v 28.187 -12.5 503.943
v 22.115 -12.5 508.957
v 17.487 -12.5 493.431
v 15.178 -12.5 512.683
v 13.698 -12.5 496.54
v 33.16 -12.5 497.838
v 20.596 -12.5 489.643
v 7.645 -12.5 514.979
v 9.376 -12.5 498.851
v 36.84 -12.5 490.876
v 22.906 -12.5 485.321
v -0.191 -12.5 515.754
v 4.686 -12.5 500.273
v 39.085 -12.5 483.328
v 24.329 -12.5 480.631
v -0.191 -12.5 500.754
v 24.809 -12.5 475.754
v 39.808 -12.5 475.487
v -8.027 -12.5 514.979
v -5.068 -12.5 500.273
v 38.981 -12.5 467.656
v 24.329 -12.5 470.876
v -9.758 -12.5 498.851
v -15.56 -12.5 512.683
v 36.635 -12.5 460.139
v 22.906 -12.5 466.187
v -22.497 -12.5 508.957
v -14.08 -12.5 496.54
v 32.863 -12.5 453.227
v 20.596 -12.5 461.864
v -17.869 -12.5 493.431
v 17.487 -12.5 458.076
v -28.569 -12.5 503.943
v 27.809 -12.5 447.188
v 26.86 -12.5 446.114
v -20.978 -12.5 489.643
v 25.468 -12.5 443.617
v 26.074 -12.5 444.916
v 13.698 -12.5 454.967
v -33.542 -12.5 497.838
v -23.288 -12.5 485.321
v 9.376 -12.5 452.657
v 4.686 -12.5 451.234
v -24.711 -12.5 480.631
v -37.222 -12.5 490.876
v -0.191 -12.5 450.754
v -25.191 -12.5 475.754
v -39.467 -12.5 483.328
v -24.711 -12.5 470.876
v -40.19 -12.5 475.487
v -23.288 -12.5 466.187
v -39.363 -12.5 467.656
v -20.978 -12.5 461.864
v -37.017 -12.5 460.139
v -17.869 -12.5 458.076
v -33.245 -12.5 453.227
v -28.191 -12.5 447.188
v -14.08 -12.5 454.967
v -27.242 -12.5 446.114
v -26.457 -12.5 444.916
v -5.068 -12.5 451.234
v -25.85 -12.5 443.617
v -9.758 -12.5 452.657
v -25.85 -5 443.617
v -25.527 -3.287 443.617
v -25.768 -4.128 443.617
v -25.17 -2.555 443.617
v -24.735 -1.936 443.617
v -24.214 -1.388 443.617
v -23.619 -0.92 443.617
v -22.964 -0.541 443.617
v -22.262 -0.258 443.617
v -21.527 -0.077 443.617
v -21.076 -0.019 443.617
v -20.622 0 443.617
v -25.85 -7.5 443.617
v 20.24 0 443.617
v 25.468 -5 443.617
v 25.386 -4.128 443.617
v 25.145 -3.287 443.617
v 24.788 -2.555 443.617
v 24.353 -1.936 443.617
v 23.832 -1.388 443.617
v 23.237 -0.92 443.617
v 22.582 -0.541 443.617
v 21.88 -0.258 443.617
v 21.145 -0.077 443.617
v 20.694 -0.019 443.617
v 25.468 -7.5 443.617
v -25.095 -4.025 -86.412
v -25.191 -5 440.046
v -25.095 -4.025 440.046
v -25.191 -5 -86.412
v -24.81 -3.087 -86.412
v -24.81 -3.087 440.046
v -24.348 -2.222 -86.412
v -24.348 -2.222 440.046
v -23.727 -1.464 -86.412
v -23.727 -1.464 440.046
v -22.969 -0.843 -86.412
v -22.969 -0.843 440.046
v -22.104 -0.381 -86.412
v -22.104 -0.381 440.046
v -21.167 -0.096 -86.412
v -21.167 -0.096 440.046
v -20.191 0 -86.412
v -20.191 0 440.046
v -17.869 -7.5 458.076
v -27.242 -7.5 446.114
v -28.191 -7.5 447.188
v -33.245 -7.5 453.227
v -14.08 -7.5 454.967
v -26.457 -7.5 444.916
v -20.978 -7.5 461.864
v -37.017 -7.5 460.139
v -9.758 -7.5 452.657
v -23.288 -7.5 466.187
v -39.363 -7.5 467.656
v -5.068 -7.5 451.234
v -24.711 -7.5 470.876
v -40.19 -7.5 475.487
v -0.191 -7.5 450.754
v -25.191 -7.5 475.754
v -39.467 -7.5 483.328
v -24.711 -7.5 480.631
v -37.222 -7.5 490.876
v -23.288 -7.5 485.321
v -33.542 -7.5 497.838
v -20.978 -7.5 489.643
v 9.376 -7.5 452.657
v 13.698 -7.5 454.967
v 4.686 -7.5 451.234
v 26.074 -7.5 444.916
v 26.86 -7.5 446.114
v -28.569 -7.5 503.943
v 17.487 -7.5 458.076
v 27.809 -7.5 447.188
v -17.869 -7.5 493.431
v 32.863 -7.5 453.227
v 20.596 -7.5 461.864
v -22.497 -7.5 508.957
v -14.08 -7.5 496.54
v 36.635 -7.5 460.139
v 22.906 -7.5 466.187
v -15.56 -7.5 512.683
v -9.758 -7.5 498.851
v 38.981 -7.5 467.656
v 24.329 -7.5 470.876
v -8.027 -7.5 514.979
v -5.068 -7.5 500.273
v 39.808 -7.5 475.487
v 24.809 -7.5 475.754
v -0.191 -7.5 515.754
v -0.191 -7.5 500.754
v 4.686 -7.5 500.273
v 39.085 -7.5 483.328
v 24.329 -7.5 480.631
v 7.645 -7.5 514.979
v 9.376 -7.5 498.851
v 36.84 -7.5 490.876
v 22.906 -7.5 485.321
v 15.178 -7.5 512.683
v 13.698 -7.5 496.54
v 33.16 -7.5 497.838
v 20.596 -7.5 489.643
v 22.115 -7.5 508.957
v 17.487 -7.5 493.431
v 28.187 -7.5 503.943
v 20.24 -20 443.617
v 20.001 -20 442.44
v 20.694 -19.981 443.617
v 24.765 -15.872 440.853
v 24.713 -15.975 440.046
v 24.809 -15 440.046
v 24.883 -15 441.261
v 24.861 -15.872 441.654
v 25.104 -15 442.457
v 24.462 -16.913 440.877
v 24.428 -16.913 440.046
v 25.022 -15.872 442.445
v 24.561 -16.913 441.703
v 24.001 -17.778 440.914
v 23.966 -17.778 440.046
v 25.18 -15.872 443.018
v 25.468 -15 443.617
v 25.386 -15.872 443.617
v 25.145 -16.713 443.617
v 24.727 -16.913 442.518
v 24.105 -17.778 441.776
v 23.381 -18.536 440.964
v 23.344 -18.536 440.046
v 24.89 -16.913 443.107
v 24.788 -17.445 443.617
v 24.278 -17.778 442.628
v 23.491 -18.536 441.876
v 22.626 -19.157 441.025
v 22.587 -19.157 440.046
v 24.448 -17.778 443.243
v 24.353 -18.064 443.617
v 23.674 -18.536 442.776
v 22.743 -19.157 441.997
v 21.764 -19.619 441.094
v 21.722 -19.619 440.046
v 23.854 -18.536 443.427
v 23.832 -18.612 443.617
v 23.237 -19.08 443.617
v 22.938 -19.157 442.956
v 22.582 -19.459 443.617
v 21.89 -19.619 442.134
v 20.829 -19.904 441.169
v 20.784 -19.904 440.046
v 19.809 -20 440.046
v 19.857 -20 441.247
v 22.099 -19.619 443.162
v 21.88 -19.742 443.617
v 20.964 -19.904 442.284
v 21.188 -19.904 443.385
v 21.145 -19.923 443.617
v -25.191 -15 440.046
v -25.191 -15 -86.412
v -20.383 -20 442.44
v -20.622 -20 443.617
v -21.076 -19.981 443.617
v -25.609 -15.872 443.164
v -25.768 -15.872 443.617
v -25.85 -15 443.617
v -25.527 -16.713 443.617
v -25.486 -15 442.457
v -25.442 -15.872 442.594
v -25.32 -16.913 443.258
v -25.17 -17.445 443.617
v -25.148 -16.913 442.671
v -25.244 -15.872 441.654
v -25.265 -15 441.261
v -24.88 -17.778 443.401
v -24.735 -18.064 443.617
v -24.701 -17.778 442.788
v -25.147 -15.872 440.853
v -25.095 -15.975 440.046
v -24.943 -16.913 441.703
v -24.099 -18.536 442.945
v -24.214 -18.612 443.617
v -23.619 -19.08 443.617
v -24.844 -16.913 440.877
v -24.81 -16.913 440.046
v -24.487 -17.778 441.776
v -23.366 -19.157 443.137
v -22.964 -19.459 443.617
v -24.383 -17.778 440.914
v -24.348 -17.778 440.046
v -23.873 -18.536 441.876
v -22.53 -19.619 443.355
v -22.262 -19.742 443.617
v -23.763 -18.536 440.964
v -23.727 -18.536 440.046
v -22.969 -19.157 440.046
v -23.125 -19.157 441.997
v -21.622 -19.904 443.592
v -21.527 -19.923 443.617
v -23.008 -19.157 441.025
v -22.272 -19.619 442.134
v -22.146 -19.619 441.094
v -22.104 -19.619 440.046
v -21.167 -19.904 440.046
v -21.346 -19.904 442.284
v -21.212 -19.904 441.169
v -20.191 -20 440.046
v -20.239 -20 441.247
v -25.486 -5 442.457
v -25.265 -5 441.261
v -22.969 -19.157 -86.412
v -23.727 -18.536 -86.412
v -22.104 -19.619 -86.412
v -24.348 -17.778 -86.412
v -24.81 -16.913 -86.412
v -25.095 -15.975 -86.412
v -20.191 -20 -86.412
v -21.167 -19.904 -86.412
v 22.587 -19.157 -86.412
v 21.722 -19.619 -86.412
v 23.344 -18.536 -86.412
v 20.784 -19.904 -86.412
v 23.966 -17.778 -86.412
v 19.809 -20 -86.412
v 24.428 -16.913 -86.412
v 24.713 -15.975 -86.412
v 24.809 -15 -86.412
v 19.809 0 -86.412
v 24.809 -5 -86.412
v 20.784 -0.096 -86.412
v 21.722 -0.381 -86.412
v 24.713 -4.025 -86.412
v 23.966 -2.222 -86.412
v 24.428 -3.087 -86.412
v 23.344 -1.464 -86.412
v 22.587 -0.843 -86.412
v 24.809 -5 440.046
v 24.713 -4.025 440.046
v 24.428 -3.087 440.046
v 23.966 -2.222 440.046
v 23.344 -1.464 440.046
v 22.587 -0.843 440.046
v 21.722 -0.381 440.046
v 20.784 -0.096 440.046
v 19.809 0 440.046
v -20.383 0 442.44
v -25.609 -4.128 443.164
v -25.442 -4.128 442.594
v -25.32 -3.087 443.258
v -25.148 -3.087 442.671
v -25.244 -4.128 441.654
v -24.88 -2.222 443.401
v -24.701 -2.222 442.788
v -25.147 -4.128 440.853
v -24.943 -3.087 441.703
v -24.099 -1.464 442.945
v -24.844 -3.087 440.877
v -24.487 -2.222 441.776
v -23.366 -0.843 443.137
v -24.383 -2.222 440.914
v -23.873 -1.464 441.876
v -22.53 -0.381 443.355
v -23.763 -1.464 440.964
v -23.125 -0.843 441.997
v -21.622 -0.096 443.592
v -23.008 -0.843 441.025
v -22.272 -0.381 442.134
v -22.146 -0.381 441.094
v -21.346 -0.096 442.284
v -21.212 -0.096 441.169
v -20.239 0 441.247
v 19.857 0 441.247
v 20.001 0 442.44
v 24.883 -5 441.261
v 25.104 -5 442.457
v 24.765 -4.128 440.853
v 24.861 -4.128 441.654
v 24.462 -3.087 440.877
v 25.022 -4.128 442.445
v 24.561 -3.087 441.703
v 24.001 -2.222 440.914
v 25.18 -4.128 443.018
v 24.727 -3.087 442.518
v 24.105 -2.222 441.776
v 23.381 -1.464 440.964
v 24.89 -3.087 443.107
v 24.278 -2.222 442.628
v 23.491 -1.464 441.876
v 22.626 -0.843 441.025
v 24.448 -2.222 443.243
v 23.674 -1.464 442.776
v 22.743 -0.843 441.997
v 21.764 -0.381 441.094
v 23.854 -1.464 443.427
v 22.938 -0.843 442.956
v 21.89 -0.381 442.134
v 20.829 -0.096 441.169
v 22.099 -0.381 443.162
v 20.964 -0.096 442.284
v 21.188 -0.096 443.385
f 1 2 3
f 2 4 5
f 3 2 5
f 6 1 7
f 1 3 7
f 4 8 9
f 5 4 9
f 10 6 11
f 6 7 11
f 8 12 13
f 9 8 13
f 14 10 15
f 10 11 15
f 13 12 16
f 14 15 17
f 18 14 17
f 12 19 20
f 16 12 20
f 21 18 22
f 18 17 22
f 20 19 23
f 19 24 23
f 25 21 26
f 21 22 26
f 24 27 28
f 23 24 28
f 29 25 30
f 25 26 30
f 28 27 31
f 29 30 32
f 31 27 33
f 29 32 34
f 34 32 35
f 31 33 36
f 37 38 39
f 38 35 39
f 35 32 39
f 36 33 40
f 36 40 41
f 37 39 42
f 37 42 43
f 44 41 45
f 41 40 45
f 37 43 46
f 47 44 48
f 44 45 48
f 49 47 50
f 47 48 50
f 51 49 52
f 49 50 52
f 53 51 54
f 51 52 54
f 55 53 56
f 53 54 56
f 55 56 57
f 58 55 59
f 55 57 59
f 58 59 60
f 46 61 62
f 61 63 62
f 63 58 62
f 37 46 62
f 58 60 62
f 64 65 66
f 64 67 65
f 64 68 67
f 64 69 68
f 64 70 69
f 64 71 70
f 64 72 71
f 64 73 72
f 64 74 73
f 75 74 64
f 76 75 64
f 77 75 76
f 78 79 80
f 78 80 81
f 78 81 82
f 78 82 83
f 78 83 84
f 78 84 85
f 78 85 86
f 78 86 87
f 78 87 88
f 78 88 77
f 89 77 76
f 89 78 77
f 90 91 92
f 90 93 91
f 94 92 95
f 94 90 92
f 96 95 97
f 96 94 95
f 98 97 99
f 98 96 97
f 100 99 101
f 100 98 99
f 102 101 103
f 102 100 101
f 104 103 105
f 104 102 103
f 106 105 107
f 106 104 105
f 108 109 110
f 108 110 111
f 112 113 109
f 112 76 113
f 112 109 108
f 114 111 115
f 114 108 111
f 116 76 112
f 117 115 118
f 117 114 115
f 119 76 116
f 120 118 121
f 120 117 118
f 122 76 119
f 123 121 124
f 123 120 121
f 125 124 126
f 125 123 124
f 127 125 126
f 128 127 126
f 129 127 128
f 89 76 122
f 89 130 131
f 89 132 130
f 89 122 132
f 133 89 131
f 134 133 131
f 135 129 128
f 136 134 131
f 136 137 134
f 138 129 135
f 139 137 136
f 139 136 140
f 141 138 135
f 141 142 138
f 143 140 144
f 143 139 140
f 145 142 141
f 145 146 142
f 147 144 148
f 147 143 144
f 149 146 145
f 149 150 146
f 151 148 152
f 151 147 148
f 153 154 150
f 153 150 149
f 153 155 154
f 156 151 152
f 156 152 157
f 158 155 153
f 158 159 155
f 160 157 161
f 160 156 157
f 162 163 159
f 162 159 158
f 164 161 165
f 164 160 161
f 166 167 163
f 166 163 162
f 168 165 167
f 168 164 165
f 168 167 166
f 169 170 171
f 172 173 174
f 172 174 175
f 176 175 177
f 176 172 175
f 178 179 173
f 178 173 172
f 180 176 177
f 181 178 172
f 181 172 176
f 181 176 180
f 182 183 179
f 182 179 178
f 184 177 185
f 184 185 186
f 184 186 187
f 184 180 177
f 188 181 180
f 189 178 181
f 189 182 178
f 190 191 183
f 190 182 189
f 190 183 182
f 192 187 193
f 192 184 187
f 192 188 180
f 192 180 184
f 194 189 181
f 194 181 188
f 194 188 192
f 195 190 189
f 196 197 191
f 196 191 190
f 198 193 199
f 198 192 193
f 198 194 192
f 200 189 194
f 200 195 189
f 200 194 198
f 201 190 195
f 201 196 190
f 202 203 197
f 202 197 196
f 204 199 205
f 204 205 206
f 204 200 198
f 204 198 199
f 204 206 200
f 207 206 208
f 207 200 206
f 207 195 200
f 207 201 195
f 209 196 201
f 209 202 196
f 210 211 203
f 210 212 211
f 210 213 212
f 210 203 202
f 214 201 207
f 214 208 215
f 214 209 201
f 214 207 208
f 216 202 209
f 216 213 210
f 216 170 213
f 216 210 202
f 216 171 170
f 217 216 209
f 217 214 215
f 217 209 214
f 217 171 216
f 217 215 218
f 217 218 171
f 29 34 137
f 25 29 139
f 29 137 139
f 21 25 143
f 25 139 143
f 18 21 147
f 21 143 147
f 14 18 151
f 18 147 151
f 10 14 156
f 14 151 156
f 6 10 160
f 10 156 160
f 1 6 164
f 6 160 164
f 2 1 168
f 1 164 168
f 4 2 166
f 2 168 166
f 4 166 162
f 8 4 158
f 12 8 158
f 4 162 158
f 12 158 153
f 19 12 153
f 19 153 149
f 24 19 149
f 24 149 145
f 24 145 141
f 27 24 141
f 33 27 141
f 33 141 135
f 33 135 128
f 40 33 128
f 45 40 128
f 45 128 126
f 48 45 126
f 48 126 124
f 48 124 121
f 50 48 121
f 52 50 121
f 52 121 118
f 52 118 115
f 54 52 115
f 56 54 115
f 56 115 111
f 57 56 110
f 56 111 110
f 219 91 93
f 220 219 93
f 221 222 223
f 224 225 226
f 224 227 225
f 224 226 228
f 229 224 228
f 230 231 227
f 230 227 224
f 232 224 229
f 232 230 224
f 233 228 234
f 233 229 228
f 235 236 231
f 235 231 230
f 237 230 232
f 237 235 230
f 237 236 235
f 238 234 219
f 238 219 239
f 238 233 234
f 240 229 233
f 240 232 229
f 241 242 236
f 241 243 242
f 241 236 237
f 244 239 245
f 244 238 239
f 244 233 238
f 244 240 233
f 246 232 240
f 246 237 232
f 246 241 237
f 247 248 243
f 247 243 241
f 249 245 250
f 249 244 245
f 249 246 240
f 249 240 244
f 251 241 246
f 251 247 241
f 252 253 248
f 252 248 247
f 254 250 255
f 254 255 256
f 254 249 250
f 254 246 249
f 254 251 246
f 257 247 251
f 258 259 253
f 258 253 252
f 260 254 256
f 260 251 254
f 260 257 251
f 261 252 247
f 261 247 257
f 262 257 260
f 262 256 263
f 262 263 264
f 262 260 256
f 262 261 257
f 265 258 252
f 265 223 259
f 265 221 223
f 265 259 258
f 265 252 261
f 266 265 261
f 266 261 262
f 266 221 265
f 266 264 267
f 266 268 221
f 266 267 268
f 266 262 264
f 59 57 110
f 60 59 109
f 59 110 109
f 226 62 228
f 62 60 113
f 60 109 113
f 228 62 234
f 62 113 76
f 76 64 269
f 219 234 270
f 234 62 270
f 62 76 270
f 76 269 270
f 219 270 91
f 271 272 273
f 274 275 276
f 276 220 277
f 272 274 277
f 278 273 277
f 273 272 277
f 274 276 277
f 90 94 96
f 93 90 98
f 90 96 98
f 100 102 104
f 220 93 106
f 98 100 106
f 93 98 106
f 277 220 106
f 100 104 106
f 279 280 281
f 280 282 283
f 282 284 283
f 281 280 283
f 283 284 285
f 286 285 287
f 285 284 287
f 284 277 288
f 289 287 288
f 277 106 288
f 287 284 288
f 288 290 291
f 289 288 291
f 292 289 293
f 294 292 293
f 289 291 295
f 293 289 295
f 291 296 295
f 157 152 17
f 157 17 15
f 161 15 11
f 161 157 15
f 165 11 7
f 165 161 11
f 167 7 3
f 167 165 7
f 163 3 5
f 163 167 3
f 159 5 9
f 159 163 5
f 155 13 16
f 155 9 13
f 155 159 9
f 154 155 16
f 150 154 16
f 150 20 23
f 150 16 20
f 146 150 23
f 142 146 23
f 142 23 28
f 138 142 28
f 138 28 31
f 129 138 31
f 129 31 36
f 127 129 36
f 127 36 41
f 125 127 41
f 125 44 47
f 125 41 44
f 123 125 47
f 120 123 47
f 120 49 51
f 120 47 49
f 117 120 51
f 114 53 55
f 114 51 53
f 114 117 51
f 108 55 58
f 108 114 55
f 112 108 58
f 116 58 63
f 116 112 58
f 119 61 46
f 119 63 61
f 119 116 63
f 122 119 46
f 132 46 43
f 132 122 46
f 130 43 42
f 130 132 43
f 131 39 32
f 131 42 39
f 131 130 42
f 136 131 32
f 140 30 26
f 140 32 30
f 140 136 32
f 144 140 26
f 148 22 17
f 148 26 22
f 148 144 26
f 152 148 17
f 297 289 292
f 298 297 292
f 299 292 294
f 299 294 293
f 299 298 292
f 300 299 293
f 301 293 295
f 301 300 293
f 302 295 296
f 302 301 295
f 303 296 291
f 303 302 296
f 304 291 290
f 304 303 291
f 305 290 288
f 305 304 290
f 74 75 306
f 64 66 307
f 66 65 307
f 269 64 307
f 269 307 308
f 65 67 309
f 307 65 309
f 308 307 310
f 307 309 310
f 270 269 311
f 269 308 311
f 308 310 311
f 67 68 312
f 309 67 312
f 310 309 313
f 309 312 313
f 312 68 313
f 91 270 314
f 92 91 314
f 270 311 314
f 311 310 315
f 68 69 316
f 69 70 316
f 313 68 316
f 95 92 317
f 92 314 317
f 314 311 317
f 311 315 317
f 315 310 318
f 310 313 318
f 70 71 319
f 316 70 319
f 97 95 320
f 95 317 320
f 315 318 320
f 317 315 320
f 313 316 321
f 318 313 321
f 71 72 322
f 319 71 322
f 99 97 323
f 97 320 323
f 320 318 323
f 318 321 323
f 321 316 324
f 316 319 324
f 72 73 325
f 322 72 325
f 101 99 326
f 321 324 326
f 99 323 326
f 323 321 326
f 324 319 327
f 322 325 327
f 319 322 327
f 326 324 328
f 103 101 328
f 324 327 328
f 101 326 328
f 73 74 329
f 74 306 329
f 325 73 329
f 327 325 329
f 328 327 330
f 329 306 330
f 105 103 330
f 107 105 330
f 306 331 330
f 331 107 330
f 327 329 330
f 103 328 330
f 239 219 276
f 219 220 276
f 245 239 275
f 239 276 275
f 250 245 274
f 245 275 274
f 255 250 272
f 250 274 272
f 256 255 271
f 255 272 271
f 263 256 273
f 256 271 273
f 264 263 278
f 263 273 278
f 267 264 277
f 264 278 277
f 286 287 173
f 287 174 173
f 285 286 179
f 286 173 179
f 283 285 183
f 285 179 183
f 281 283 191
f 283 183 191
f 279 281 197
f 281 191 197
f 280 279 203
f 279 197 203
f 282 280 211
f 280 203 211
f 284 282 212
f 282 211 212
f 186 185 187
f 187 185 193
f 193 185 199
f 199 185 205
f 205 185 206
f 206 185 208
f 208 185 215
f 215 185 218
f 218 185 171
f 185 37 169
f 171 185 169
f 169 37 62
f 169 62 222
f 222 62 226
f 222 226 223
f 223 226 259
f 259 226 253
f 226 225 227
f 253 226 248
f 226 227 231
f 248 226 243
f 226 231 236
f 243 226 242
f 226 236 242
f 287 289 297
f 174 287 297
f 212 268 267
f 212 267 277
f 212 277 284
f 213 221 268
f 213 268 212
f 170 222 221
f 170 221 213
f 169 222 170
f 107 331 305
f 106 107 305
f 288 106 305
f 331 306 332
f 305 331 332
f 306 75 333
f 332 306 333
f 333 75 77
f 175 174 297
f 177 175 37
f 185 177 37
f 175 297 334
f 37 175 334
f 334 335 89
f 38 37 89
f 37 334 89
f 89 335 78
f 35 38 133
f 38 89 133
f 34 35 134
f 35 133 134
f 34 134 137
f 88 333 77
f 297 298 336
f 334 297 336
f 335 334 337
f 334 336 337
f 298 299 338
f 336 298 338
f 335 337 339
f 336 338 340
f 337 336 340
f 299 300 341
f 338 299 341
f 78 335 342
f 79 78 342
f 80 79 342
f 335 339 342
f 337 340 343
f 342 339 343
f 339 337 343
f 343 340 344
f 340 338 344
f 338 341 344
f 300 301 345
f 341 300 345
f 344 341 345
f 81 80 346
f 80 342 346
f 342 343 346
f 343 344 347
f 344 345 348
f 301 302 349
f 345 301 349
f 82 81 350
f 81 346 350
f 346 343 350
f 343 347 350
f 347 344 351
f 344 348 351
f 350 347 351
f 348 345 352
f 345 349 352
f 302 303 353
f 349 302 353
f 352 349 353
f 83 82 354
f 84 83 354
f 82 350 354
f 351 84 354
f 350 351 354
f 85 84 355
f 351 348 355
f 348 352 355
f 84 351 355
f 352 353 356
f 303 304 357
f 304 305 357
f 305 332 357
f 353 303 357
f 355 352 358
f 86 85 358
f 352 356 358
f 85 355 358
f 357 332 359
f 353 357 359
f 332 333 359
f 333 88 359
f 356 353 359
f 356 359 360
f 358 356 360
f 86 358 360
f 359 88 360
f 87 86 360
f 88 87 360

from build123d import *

# Parameters (mm, degrees)
F0_R     = 25
F1_DEPTH = 20
F3_R     = 5
F4_DEPTH = 70


with BuildPart() as f1:
    # F0 (on Front) → F1 (new body)
    with BuildSketch(Plane.XZ):
        with BuildLine():
            Line((-25.191063, 440.046496), (-25.191063, -86.412484))
            Line((-25.191063, -86.412484), (24.808937, -86.412484))
            Line((24.808937, -86.412484), (24.808937, 440.046496))
            ThreePointArc((24.808937, 440.046496), (25.589393, 443.919479), (27.808937, 447.187924))
            ThreePointArc((27.808937, 447.187924), (-0.191063, 515.753638), (-28.191063, 447.187924))
            ThreePointArc((-28.191063, 447.187924), (-25.971518, 443.919479), (-25.191063, 440.046496))
        make_face()
        with Locations((-0.191063, 475.753638)):
            Circle(F0_R, mode=Mode.SUBTRACT)
    extrude(amount=F1_DEPTH)

    # F3
    f3_edges = [f1.edges().sort_by_distance(p)[0] for p in [
        (-25.191063, -20, 176.817006),
        (-25.191063, 0, 176.817006),
    ]]
    fillet(f3_edges, radius=F3_R)

    # F2 (on face) → F4 (cut, symmetric)
    with BuildSketch(Plane(origin=(-25.191063, 0, 0), x_dir=(0, -1, 0), z_dir=(-1, 0, 0))):
        Polygon((7.5, 443.61721), (7.5, 515.753638), (0, 515.753638), (0, 500.753638), (0, 450.753638), (0, 447.187924), (0, 443.61721), align=None)
        Polygon((20, 450.753638), (20, 500.753638), (20, 515.753638), (12.5, 515.753638), (12.5, 443.61721), (20, 443.61721), (20, 447.187924), align=None)
    extrude(amount=F4_DEPTH, both=True, mode=Mode.SUBTRACT)


solid = f1.part
